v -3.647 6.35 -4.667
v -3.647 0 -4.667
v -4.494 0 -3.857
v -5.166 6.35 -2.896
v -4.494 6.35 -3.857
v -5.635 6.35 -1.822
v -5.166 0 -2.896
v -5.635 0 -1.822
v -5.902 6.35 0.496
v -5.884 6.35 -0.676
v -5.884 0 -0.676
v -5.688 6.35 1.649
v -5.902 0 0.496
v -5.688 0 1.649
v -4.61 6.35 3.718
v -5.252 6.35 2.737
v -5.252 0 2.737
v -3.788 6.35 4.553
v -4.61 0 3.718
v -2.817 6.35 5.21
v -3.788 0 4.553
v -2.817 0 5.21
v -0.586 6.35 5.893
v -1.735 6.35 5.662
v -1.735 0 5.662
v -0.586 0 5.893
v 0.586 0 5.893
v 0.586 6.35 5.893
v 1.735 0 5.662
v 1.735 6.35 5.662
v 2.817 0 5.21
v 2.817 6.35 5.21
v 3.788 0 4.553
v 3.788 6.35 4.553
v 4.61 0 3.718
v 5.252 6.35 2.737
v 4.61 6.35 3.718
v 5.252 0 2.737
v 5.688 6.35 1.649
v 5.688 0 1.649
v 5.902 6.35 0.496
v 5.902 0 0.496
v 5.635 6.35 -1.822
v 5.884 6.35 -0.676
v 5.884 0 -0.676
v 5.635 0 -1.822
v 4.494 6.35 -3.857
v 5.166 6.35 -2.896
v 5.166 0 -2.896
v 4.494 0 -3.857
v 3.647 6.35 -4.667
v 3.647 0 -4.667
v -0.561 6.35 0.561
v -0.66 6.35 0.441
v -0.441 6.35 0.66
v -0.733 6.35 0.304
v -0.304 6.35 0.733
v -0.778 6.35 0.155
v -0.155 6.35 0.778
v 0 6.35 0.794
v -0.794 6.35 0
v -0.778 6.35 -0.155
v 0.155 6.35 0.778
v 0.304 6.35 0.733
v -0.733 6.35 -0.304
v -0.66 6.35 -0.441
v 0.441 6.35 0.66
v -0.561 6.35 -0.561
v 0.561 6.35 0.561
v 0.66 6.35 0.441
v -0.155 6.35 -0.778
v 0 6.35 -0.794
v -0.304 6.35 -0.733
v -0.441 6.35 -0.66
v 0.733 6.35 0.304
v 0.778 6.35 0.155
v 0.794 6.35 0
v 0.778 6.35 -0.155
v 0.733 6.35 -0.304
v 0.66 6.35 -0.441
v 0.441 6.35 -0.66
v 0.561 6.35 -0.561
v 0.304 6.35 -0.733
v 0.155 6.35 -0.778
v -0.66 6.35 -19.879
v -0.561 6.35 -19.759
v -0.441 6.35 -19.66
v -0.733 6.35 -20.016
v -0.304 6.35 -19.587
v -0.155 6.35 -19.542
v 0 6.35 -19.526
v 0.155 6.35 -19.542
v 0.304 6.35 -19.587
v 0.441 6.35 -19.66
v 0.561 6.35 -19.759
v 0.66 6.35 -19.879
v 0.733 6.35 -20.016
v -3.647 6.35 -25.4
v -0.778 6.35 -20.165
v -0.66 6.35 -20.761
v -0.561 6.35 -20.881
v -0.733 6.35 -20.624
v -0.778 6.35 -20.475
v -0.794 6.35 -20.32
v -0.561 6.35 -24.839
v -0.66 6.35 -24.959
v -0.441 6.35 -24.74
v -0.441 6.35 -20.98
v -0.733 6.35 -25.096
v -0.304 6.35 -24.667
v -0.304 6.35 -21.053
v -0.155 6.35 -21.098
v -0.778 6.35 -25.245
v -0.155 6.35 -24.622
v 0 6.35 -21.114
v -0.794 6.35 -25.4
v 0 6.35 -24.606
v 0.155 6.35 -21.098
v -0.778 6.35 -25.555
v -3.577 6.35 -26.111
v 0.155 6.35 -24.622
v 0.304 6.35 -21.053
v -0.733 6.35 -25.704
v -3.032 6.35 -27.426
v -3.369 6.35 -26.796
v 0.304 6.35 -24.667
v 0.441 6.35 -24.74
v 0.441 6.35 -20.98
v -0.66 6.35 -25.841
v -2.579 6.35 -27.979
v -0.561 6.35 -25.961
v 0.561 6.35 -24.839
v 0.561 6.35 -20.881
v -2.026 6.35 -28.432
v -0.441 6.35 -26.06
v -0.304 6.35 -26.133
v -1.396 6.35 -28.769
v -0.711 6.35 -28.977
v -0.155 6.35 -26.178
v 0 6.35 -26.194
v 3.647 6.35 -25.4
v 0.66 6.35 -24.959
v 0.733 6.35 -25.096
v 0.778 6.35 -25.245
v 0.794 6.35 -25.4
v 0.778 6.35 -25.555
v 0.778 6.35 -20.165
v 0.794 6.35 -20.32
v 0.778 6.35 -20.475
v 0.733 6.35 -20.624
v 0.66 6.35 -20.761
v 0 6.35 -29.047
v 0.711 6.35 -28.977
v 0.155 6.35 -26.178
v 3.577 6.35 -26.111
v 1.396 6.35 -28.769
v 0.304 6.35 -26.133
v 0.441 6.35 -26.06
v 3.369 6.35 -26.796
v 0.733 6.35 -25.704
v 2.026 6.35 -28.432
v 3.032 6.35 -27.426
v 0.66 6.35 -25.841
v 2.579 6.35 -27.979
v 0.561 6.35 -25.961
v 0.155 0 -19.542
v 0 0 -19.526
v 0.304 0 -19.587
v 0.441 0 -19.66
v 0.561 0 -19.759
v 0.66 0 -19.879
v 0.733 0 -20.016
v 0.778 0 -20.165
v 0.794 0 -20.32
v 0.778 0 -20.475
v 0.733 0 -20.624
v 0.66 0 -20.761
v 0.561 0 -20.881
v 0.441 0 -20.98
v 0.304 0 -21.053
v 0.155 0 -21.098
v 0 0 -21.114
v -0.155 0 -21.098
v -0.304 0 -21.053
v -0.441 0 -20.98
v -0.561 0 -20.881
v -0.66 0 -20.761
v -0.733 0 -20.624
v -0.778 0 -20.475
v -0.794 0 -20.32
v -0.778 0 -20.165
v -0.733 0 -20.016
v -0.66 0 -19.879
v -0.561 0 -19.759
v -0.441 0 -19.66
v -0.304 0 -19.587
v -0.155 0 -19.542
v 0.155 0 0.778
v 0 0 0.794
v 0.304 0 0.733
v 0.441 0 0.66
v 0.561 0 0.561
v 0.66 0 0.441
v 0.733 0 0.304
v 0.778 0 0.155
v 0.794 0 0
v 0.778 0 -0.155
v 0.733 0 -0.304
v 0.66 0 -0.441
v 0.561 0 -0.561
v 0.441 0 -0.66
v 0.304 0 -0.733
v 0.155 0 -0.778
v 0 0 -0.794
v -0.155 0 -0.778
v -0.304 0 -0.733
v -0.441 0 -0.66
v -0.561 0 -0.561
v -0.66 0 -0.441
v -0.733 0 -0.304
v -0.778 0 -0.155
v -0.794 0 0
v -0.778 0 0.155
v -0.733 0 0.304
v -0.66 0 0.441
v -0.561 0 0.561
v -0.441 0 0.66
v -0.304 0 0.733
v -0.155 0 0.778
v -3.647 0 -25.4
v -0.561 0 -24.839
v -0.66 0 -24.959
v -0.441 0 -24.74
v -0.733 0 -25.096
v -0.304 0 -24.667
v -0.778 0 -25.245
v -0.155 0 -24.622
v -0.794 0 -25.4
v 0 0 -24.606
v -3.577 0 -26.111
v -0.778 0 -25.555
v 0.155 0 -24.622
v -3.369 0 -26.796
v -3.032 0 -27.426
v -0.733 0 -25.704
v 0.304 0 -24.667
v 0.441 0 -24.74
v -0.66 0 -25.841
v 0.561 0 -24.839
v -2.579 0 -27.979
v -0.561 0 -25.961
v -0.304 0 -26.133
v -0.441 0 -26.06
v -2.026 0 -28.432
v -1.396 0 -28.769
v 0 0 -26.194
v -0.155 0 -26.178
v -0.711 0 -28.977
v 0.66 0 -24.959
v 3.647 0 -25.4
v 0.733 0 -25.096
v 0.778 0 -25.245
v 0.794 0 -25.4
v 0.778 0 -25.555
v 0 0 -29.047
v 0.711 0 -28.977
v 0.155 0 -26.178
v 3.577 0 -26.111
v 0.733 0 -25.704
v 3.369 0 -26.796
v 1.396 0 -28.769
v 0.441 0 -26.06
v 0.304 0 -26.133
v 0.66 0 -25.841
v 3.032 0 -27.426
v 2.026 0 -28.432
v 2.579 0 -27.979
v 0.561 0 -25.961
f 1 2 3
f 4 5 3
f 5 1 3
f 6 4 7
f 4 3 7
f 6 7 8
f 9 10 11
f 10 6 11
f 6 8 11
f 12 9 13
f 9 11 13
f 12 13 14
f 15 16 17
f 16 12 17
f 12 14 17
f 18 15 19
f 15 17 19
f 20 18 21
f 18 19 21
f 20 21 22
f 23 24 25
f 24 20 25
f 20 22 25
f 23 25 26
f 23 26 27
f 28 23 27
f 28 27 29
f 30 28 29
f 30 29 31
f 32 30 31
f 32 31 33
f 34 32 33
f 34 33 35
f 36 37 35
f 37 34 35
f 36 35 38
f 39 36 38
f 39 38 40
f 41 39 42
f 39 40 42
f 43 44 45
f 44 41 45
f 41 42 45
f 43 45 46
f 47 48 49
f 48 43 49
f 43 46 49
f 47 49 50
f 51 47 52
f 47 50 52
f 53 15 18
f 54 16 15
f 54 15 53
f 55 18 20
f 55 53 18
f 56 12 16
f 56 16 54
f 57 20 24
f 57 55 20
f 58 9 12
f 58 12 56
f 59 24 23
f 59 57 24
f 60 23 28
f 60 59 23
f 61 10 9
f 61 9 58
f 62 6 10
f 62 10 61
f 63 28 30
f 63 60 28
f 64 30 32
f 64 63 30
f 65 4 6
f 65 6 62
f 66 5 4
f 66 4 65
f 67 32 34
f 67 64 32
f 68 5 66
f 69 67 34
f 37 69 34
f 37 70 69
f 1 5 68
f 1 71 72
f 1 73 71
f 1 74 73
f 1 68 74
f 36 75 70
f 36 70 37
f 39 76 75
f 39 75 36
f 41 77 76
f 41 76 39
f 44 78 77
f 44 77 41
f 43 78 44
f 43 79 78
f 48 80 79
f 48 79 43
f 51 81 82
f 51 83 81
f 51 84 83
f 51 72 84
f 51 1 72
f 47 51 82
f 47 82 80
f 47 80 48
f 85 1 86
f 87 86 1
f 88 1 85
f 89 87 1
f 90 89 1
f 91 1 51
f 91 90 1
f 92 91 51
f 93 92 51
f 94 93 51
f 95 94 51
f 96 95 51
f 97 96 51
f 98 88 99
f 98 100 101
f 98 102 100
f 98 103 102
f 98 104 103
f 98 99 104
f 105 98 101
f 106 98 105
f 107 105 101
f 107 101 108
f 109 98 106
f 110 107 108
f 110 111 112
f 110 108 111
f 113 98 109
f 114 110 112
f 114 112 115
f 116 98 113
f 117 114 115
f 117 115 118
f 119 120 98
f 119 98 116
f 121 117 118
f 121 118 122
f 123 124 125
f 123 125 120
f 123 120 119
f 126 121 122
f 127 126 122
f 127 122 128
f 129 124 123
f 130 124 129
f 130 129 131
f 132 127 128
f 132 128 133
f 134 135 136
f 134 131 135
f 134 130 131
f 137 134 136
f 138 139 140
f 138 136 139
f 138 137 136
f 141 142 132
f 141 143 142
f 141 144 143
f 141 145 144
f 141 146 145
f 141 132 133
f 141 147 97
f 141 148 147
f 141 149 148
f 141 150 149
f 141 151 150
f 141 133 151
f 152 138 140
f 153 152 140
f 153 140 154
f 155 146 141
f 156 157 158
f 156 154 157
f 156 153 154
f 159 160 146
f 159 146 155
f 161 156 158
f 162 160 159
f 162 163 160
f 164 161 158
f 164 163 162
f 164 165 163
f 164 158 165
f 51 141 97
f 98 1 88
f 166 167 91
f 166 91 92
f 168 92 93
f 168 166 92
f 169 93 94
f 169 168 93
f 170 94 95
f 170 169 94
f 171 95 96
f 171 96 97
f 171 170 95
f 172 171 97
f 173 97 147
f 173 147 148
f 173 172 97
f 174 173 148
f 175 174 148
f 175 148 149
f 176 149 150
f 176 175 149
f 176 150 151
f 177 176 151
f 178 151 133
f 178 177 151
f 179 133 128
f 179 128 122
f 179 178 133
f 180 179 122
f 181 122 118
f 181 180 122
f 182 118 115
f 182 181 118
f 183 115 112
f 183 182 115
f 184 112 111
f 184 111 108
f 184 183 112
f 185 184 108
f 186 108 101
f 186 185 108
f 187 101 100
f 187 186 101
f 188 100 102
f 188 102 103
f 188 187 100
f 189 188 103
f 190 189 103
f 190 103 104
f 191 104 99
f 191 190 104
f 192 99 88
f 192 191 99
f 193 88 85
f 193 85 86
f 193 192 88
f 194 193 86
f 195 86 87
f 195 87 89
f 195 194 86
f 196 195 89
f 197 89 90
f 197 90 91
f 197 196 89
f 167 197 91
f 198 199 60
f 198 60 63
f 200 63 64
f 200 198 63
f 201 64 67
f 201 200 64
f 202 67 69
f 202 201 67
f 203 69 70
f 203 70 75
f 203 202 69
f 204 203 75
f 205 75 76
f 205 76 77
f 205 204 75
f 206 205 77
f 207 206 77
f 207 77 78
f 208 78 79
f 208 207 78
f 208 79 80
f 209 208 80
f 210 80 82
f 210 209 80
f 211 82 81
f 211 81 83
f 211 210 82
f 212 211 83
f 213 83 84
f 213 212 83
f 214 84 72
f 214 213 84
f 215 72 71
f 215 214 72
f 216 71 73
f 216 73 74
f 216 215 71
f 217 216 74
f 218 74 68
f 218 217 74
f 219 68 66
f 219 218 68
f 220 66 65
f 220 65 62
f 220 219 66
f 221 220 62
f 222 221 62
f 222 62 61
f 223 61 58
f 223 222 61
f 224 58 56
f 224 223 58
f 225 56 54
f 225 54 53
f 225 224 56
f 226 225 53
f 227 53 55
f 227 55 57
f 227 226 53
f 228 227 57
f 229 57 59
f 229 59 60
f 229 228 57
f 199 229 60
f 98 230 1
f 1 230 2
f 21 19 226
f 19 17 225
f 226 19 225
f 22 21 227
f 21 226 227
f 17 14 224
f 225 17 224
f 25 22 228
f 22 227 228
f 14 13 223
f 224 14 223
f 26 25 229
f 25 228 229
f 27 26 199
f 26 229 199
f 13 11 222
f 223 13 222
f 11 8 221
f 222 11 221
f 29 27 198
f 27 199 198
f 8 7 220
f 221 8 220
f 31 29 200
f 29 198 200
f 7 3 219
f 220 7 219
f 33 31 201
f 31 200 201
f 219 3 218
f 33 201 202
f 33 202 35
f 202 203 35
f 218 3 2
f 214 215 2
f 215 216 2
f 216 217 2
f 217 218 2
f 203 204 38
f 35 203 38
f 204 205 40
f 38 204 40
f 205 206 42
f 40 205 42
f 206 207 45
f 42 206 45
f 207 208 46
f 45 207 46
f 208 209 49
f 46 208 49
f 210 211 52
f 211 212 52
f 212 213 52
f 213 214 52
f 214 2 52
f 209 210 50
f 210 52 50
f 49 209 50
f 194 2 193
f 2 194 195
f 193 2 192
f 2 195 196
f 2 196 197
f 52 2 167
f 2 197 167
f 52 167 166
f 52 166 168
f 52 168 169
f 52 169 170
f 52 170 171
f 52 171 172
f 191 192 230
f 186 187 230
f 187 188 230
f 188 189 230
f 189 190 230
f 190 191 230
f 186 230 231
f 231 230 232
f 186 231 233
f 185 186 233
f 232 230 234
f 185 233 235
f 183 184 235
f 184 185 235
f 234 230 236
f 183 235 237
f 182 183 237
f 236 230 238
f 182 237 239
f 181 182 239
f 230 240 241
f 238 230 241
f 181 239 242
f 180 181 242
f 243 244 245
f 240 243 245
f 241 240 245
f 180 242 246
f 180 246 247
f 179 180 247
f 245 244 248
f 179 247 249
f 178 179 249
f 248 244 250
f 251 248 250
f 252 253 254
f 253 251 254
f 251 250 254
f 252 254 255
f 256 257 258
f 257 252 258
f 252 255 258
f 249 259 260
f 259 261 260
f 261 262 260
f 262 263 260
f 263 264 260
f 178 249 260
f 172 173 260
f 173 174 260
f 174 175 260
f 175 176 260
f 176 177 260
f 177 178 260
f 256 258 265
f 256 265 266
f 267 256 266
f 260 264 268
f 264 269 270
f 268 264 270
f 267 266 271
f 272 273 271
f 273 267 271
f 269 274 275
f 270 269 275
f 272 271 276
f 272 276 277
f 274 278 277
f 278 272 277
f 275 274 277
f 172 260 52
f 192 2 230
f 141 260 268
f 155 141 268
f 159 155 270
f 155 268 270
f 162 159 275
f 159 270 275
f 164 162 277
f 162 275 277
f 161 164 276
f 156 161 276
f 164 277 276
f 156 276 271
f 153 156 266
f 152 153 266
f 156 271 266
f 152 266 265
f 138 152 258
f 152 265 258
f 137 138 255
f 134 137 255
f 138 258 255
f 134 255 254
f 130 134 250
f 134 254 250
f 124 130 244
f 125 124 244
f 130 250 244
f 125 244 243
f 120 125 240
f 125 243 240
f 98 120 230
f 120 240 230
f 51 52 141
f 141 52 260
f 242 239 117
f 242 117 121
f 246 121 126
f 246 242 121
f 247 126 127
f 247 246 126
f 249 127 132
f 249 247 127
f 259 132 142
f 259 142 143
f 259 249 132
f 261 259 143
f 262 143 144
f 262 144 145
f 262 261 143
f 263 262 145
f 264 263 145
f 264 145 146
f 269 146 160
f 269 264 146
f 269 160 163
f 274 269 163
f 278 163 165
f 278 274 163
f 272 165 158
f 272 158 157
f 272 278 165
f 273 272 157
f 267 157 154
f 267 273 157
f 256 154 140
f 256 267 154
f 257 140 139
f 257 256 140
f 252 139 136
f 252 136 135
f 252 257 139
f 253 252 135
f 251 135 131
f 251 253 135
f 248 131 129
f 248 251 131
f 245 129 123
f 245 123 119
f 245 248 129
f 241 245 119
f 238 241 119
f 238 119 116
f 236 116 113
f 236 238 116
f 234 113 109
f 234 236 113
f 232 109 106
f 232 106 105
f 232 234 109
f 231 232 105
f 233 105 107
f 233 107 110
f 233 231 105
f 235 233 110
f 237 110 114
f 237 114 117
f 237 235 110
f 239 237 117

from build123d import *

# Parameters (mm, degrees)
SKETCH1_R           = 5.922468873
SKETCH1_R_2         = 4.194729015
SKETCH1_R_3         = 0.79375
BOSS_EXTRUDE1_DEPTH = 6.35


with BuildPart() as part:
    # Sketch1 → Boss-Extrude1 (new body)
    # profile 1 of 3: a face of its own
    with BuildSketch(Plane(origin=(0, 0, 0), x_dir=(1, 0, 0), z_dir=(0, 1, 0))):
        Circle(SKETCH1_R)
        Circle(SKETCH1_R_2, mode=Mode.SUBTRACT)
    # profile 2 of 3: a face of its own
    with BuildSketch(Plane(origin=(0, 0, 0), x_dir=(1, 0, 0), z_dir=(0, 1, 0))):
        Circle(SKETCH1_R_2)
        with Locations(Location((0, 0, 0), (0, 0, 270))):
            Circle(SKETCH1_R_3, mode=Mode.SUBTRACT)
    # profile 3 of 3: a face of its own
    with BuildSketch(Plane(origin=(0, 0, 0), x_dir=(1, 0, 0), z_dir=(0, 1, 0))):
        with BuildLine():
            ThreePointArc((3.646669154, 25.4), (0, 29.046669154), (-3.646669154, 25.4))
            Line((-3.646669154, 25.4), (-3.646669154, 4.666630651))
            ThreePointArc((-3.646669154, 4.666630651), (0, 5.922468873), (3.646669154, 4.666630651))
            Line((3.646669154, 4.666630651), (3.646669154, 25.4))
        make_face()
        with Locations(Location((0, 20.32, 0), (0, 0, 270))):
            Circle(SKETCH1_R_3, mode=Mode.SUBTRACT)
        with Locations(Location((0, 25.4, 0), (0, 0, 270))):
            Circle(SKETCH1_R_3, mode=Mode.SUBTRACT)
    extrude(amount=BOSS_EXTRUDE1_DEPTH)


solid = part.part
